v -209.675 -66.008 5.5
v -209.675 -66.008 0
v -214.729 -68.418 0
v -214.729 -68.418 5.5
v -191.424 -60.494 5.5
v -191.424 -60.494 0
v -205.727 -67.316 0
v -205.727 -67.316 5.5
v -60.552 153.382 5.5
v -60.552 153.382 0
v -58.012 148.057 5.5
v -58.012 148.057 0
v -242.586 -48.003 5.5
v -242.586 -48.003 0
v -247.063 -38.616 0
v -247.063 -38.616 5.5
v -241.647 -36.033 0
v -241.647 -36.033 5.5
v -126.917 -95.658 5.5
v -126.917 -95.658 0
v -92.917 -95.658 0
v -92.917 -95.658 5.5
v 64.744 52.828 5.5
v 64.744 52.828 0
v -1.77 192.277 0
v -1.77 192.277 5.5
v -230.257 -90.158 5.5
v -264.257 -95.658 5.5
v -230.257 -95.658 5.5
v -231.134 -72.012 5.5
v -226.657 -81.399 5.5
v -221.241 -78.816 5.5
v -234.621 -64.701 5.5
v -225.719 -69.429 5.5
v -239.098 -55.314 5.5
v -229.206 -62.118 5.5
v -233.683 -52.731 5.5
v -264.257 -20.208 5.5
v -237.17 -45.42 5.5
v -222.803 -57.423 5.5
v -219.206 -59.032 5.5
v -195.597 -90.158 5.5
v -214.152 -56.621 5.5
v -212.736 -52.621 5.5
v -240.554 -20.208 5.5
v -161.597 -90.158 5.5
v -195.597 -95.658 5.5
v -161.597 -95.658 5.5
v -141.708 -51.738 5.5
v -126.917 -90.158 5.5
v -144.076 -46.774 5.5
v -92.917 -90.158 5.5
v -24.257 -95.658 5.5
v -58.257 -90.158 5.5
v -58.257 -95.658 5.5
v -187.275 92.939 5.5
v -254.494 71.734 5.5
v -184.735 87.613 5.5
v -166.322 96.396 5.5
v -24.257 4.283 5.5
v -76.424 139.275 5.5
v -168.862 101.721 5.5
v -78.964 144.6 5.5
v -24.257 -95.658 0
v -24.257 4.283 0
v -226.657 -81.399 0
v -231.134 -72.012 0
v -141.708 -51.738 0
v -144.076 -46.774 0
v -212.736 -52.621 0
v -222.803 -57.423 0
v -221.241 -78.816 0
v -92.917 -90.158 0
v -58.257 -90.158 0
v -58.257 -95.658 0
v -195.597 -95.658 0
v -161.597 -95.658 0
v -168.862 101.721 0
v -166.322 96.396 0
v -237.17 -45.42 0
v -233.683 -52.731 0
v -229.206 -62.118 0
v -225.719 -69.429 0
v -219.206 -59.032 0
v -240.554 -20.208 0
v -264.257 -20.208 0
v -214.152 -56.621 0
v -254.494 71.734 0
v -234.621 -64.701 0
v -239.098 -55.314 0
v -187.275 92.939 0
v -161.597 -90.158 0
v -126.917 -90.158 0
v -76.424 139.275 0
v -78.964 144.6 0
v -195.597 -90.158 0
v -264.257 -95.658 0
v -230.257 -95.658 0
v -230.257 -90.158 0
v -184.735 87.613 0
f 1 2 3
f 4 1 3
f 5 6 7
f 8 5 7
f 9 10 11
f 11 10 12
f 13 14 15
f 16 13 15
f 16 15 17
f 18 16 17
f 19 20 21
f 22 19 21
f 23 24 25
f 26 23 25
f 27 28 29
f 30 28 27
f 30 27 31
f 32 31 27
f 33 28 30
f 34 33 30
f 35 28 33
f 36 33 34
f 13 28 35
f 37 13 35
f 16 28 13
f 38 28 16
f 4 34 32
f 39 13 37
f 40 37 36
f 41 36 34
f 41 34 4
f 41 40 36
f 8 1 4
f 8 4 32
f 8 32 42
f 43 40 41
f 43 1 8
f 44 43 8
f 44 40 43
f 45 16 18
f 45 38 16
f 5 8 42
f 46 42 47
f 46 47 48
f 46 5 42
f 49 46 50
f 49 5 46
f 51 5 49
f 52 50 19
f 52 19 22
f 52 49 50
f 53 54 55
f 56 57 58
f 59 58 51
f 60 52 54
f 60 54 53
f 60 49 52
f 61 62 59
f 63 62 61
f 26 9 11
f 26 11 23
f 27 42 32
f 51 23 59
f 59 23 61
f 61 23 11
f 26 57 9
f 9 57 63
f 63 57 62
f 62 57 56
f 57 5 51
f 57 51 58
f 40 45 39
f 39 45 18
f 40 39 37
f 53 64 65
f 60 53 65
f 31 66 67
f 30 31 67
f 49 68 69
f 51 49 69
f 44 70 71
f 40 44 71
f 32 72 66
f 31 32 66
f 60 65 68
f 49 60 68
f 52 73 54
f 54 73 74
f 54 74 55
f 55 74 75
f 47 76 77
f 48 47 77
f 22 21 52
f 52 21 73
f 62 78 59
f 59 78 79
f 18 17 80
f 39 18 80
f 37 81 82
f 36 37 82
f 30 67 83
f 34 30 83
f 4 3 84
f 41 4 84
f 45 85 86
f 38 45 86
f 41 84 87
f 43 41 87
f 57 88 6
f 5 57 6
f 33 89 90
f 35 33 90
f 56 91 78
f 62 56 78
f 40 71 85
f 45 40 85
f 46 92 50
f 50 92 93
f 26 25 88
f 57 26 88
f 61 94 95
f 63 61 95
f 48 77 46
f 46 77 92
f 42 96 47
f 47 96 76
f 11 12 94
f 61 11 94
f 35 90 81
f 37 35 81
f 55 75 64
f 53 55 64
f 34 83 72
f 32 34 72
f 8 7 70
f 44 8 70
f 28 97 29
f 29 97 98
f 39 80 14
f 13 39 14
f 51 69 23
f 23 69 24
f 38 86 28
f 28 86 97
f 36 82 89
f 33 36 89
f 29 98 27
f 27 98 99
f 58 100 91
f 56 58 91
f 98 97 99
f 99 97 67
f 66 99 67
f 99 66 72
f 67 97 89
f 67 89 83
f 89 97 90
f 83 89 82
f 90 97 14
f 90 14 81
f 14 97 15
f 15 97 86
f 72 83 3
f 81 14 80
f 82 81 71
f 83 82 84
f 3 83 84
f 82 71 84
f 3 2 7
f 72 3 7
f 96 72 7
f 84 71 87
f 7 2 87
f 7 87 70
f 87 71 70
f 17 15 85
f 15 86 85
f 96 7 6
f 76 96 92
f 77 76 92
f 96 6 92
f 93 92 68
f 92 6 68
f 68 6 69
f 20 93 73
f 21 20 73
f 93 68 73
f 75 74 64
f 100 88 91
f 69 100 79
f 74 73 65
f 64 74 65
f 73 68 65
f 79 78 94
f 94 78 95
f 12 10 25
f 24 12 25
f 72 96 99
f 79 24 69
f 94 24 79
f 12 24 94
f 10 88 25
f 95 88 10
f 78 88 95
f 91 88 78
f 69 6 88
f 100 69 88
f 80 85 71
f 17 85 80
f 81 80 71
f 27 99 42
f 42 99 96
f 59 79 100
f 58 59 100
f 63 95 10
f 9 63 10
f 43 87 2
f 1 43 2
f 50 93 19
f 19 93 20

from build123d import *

# Parameters (mm, degrees)
BOSS_EXTRUDE1_DEPTH = 5.5


with BuildPart() as part:
    # Sketch1 → Boss-Extrude1 (new body)
    with BuildSketch(Plane.XY):
        Polygon((-264.257200354, -90.158072964), (-264.257200354, -95.658072964), (-230.257200354, -95.658072964), (-230.257200354, -90.158072964), (-195.597200354, -90.158072964), (-195.597200354, -95.658072964), (-161.597200354, -95.658072964), (-161.597200354, -90.158072964), (-126.917200354, -90.158072964), (-126.917200354, -95.658072964), (-92.917200354, -95.658072964), (-92.917200354, -90.158072964), (-58.257200354, -90.158072964), (-58.257200354, -95.658072964), (-24.257200354, -95.658072964), (-24.257200354, -90.158072964), (-24.257200354, 4.28308251), (-141.707906421, -51.738030582), (-144.075717453, -46.773811518), (64.743830776, 52.828003736), (-1.770133681, 192.277430168), (-254.494013299, 71.734323062), (-191.424137459, -60.49442102), (-205.726515812, -67.316305554), (-212.73562074, -52.621411895), (-222.803045061, -57.423326974), (-240.553810667, -20.208072964), (-264.257200354, -20.208072964), align=None)
        Polygon((-226.65672616, -81.398839397), (-231.134041567, -72.01195244), (-225.718529861, -69.428885859), (-221.241214454, -78.815772816), align=None, mode=Mode.SUBTRACT)
        Polygon((-214.729005488, -68.418450138), (-219.206320895, -59.031563181), (-214.151843303, -56.620701038), (-209.674527896, -66.007587996), align=None, mode=Mode.SUBTRACT)
        Polygon((-233.682985152, -52.731058098), (-229.205669745, -62.117945056), (-234.621181451, -64.701011637), (-239.098496858, -55.314124679), align=None, mode=Mode.SUBTRACT)
        Polygon((-241.647440443, -36.033230338), (-237.170125036, -45.420117295), (-242.585636742, -48.003183876), (-247.062952149, -38.616296919), align=None, mode=Mode.SUBTRACT)
        Polygon((-168.861811902, 101.721088208), (-166.321796431, 96.39583503), (-184.734536232, 87.613408655), (-187.274551703, 92.938661833), align=None, mode=Mode.SUBTRACT)
        Polygon((-60.55157778, 153.382419825), (-58.011562309, 148.057166647), (-76.42430211, 139.274740272), (-78.964317581, 144.59999345), align=None, mode=Mode.SUBTRACT)
    extrude(amount=BOSS_EXTRUDE1_DEPTH)


solid = part.part
